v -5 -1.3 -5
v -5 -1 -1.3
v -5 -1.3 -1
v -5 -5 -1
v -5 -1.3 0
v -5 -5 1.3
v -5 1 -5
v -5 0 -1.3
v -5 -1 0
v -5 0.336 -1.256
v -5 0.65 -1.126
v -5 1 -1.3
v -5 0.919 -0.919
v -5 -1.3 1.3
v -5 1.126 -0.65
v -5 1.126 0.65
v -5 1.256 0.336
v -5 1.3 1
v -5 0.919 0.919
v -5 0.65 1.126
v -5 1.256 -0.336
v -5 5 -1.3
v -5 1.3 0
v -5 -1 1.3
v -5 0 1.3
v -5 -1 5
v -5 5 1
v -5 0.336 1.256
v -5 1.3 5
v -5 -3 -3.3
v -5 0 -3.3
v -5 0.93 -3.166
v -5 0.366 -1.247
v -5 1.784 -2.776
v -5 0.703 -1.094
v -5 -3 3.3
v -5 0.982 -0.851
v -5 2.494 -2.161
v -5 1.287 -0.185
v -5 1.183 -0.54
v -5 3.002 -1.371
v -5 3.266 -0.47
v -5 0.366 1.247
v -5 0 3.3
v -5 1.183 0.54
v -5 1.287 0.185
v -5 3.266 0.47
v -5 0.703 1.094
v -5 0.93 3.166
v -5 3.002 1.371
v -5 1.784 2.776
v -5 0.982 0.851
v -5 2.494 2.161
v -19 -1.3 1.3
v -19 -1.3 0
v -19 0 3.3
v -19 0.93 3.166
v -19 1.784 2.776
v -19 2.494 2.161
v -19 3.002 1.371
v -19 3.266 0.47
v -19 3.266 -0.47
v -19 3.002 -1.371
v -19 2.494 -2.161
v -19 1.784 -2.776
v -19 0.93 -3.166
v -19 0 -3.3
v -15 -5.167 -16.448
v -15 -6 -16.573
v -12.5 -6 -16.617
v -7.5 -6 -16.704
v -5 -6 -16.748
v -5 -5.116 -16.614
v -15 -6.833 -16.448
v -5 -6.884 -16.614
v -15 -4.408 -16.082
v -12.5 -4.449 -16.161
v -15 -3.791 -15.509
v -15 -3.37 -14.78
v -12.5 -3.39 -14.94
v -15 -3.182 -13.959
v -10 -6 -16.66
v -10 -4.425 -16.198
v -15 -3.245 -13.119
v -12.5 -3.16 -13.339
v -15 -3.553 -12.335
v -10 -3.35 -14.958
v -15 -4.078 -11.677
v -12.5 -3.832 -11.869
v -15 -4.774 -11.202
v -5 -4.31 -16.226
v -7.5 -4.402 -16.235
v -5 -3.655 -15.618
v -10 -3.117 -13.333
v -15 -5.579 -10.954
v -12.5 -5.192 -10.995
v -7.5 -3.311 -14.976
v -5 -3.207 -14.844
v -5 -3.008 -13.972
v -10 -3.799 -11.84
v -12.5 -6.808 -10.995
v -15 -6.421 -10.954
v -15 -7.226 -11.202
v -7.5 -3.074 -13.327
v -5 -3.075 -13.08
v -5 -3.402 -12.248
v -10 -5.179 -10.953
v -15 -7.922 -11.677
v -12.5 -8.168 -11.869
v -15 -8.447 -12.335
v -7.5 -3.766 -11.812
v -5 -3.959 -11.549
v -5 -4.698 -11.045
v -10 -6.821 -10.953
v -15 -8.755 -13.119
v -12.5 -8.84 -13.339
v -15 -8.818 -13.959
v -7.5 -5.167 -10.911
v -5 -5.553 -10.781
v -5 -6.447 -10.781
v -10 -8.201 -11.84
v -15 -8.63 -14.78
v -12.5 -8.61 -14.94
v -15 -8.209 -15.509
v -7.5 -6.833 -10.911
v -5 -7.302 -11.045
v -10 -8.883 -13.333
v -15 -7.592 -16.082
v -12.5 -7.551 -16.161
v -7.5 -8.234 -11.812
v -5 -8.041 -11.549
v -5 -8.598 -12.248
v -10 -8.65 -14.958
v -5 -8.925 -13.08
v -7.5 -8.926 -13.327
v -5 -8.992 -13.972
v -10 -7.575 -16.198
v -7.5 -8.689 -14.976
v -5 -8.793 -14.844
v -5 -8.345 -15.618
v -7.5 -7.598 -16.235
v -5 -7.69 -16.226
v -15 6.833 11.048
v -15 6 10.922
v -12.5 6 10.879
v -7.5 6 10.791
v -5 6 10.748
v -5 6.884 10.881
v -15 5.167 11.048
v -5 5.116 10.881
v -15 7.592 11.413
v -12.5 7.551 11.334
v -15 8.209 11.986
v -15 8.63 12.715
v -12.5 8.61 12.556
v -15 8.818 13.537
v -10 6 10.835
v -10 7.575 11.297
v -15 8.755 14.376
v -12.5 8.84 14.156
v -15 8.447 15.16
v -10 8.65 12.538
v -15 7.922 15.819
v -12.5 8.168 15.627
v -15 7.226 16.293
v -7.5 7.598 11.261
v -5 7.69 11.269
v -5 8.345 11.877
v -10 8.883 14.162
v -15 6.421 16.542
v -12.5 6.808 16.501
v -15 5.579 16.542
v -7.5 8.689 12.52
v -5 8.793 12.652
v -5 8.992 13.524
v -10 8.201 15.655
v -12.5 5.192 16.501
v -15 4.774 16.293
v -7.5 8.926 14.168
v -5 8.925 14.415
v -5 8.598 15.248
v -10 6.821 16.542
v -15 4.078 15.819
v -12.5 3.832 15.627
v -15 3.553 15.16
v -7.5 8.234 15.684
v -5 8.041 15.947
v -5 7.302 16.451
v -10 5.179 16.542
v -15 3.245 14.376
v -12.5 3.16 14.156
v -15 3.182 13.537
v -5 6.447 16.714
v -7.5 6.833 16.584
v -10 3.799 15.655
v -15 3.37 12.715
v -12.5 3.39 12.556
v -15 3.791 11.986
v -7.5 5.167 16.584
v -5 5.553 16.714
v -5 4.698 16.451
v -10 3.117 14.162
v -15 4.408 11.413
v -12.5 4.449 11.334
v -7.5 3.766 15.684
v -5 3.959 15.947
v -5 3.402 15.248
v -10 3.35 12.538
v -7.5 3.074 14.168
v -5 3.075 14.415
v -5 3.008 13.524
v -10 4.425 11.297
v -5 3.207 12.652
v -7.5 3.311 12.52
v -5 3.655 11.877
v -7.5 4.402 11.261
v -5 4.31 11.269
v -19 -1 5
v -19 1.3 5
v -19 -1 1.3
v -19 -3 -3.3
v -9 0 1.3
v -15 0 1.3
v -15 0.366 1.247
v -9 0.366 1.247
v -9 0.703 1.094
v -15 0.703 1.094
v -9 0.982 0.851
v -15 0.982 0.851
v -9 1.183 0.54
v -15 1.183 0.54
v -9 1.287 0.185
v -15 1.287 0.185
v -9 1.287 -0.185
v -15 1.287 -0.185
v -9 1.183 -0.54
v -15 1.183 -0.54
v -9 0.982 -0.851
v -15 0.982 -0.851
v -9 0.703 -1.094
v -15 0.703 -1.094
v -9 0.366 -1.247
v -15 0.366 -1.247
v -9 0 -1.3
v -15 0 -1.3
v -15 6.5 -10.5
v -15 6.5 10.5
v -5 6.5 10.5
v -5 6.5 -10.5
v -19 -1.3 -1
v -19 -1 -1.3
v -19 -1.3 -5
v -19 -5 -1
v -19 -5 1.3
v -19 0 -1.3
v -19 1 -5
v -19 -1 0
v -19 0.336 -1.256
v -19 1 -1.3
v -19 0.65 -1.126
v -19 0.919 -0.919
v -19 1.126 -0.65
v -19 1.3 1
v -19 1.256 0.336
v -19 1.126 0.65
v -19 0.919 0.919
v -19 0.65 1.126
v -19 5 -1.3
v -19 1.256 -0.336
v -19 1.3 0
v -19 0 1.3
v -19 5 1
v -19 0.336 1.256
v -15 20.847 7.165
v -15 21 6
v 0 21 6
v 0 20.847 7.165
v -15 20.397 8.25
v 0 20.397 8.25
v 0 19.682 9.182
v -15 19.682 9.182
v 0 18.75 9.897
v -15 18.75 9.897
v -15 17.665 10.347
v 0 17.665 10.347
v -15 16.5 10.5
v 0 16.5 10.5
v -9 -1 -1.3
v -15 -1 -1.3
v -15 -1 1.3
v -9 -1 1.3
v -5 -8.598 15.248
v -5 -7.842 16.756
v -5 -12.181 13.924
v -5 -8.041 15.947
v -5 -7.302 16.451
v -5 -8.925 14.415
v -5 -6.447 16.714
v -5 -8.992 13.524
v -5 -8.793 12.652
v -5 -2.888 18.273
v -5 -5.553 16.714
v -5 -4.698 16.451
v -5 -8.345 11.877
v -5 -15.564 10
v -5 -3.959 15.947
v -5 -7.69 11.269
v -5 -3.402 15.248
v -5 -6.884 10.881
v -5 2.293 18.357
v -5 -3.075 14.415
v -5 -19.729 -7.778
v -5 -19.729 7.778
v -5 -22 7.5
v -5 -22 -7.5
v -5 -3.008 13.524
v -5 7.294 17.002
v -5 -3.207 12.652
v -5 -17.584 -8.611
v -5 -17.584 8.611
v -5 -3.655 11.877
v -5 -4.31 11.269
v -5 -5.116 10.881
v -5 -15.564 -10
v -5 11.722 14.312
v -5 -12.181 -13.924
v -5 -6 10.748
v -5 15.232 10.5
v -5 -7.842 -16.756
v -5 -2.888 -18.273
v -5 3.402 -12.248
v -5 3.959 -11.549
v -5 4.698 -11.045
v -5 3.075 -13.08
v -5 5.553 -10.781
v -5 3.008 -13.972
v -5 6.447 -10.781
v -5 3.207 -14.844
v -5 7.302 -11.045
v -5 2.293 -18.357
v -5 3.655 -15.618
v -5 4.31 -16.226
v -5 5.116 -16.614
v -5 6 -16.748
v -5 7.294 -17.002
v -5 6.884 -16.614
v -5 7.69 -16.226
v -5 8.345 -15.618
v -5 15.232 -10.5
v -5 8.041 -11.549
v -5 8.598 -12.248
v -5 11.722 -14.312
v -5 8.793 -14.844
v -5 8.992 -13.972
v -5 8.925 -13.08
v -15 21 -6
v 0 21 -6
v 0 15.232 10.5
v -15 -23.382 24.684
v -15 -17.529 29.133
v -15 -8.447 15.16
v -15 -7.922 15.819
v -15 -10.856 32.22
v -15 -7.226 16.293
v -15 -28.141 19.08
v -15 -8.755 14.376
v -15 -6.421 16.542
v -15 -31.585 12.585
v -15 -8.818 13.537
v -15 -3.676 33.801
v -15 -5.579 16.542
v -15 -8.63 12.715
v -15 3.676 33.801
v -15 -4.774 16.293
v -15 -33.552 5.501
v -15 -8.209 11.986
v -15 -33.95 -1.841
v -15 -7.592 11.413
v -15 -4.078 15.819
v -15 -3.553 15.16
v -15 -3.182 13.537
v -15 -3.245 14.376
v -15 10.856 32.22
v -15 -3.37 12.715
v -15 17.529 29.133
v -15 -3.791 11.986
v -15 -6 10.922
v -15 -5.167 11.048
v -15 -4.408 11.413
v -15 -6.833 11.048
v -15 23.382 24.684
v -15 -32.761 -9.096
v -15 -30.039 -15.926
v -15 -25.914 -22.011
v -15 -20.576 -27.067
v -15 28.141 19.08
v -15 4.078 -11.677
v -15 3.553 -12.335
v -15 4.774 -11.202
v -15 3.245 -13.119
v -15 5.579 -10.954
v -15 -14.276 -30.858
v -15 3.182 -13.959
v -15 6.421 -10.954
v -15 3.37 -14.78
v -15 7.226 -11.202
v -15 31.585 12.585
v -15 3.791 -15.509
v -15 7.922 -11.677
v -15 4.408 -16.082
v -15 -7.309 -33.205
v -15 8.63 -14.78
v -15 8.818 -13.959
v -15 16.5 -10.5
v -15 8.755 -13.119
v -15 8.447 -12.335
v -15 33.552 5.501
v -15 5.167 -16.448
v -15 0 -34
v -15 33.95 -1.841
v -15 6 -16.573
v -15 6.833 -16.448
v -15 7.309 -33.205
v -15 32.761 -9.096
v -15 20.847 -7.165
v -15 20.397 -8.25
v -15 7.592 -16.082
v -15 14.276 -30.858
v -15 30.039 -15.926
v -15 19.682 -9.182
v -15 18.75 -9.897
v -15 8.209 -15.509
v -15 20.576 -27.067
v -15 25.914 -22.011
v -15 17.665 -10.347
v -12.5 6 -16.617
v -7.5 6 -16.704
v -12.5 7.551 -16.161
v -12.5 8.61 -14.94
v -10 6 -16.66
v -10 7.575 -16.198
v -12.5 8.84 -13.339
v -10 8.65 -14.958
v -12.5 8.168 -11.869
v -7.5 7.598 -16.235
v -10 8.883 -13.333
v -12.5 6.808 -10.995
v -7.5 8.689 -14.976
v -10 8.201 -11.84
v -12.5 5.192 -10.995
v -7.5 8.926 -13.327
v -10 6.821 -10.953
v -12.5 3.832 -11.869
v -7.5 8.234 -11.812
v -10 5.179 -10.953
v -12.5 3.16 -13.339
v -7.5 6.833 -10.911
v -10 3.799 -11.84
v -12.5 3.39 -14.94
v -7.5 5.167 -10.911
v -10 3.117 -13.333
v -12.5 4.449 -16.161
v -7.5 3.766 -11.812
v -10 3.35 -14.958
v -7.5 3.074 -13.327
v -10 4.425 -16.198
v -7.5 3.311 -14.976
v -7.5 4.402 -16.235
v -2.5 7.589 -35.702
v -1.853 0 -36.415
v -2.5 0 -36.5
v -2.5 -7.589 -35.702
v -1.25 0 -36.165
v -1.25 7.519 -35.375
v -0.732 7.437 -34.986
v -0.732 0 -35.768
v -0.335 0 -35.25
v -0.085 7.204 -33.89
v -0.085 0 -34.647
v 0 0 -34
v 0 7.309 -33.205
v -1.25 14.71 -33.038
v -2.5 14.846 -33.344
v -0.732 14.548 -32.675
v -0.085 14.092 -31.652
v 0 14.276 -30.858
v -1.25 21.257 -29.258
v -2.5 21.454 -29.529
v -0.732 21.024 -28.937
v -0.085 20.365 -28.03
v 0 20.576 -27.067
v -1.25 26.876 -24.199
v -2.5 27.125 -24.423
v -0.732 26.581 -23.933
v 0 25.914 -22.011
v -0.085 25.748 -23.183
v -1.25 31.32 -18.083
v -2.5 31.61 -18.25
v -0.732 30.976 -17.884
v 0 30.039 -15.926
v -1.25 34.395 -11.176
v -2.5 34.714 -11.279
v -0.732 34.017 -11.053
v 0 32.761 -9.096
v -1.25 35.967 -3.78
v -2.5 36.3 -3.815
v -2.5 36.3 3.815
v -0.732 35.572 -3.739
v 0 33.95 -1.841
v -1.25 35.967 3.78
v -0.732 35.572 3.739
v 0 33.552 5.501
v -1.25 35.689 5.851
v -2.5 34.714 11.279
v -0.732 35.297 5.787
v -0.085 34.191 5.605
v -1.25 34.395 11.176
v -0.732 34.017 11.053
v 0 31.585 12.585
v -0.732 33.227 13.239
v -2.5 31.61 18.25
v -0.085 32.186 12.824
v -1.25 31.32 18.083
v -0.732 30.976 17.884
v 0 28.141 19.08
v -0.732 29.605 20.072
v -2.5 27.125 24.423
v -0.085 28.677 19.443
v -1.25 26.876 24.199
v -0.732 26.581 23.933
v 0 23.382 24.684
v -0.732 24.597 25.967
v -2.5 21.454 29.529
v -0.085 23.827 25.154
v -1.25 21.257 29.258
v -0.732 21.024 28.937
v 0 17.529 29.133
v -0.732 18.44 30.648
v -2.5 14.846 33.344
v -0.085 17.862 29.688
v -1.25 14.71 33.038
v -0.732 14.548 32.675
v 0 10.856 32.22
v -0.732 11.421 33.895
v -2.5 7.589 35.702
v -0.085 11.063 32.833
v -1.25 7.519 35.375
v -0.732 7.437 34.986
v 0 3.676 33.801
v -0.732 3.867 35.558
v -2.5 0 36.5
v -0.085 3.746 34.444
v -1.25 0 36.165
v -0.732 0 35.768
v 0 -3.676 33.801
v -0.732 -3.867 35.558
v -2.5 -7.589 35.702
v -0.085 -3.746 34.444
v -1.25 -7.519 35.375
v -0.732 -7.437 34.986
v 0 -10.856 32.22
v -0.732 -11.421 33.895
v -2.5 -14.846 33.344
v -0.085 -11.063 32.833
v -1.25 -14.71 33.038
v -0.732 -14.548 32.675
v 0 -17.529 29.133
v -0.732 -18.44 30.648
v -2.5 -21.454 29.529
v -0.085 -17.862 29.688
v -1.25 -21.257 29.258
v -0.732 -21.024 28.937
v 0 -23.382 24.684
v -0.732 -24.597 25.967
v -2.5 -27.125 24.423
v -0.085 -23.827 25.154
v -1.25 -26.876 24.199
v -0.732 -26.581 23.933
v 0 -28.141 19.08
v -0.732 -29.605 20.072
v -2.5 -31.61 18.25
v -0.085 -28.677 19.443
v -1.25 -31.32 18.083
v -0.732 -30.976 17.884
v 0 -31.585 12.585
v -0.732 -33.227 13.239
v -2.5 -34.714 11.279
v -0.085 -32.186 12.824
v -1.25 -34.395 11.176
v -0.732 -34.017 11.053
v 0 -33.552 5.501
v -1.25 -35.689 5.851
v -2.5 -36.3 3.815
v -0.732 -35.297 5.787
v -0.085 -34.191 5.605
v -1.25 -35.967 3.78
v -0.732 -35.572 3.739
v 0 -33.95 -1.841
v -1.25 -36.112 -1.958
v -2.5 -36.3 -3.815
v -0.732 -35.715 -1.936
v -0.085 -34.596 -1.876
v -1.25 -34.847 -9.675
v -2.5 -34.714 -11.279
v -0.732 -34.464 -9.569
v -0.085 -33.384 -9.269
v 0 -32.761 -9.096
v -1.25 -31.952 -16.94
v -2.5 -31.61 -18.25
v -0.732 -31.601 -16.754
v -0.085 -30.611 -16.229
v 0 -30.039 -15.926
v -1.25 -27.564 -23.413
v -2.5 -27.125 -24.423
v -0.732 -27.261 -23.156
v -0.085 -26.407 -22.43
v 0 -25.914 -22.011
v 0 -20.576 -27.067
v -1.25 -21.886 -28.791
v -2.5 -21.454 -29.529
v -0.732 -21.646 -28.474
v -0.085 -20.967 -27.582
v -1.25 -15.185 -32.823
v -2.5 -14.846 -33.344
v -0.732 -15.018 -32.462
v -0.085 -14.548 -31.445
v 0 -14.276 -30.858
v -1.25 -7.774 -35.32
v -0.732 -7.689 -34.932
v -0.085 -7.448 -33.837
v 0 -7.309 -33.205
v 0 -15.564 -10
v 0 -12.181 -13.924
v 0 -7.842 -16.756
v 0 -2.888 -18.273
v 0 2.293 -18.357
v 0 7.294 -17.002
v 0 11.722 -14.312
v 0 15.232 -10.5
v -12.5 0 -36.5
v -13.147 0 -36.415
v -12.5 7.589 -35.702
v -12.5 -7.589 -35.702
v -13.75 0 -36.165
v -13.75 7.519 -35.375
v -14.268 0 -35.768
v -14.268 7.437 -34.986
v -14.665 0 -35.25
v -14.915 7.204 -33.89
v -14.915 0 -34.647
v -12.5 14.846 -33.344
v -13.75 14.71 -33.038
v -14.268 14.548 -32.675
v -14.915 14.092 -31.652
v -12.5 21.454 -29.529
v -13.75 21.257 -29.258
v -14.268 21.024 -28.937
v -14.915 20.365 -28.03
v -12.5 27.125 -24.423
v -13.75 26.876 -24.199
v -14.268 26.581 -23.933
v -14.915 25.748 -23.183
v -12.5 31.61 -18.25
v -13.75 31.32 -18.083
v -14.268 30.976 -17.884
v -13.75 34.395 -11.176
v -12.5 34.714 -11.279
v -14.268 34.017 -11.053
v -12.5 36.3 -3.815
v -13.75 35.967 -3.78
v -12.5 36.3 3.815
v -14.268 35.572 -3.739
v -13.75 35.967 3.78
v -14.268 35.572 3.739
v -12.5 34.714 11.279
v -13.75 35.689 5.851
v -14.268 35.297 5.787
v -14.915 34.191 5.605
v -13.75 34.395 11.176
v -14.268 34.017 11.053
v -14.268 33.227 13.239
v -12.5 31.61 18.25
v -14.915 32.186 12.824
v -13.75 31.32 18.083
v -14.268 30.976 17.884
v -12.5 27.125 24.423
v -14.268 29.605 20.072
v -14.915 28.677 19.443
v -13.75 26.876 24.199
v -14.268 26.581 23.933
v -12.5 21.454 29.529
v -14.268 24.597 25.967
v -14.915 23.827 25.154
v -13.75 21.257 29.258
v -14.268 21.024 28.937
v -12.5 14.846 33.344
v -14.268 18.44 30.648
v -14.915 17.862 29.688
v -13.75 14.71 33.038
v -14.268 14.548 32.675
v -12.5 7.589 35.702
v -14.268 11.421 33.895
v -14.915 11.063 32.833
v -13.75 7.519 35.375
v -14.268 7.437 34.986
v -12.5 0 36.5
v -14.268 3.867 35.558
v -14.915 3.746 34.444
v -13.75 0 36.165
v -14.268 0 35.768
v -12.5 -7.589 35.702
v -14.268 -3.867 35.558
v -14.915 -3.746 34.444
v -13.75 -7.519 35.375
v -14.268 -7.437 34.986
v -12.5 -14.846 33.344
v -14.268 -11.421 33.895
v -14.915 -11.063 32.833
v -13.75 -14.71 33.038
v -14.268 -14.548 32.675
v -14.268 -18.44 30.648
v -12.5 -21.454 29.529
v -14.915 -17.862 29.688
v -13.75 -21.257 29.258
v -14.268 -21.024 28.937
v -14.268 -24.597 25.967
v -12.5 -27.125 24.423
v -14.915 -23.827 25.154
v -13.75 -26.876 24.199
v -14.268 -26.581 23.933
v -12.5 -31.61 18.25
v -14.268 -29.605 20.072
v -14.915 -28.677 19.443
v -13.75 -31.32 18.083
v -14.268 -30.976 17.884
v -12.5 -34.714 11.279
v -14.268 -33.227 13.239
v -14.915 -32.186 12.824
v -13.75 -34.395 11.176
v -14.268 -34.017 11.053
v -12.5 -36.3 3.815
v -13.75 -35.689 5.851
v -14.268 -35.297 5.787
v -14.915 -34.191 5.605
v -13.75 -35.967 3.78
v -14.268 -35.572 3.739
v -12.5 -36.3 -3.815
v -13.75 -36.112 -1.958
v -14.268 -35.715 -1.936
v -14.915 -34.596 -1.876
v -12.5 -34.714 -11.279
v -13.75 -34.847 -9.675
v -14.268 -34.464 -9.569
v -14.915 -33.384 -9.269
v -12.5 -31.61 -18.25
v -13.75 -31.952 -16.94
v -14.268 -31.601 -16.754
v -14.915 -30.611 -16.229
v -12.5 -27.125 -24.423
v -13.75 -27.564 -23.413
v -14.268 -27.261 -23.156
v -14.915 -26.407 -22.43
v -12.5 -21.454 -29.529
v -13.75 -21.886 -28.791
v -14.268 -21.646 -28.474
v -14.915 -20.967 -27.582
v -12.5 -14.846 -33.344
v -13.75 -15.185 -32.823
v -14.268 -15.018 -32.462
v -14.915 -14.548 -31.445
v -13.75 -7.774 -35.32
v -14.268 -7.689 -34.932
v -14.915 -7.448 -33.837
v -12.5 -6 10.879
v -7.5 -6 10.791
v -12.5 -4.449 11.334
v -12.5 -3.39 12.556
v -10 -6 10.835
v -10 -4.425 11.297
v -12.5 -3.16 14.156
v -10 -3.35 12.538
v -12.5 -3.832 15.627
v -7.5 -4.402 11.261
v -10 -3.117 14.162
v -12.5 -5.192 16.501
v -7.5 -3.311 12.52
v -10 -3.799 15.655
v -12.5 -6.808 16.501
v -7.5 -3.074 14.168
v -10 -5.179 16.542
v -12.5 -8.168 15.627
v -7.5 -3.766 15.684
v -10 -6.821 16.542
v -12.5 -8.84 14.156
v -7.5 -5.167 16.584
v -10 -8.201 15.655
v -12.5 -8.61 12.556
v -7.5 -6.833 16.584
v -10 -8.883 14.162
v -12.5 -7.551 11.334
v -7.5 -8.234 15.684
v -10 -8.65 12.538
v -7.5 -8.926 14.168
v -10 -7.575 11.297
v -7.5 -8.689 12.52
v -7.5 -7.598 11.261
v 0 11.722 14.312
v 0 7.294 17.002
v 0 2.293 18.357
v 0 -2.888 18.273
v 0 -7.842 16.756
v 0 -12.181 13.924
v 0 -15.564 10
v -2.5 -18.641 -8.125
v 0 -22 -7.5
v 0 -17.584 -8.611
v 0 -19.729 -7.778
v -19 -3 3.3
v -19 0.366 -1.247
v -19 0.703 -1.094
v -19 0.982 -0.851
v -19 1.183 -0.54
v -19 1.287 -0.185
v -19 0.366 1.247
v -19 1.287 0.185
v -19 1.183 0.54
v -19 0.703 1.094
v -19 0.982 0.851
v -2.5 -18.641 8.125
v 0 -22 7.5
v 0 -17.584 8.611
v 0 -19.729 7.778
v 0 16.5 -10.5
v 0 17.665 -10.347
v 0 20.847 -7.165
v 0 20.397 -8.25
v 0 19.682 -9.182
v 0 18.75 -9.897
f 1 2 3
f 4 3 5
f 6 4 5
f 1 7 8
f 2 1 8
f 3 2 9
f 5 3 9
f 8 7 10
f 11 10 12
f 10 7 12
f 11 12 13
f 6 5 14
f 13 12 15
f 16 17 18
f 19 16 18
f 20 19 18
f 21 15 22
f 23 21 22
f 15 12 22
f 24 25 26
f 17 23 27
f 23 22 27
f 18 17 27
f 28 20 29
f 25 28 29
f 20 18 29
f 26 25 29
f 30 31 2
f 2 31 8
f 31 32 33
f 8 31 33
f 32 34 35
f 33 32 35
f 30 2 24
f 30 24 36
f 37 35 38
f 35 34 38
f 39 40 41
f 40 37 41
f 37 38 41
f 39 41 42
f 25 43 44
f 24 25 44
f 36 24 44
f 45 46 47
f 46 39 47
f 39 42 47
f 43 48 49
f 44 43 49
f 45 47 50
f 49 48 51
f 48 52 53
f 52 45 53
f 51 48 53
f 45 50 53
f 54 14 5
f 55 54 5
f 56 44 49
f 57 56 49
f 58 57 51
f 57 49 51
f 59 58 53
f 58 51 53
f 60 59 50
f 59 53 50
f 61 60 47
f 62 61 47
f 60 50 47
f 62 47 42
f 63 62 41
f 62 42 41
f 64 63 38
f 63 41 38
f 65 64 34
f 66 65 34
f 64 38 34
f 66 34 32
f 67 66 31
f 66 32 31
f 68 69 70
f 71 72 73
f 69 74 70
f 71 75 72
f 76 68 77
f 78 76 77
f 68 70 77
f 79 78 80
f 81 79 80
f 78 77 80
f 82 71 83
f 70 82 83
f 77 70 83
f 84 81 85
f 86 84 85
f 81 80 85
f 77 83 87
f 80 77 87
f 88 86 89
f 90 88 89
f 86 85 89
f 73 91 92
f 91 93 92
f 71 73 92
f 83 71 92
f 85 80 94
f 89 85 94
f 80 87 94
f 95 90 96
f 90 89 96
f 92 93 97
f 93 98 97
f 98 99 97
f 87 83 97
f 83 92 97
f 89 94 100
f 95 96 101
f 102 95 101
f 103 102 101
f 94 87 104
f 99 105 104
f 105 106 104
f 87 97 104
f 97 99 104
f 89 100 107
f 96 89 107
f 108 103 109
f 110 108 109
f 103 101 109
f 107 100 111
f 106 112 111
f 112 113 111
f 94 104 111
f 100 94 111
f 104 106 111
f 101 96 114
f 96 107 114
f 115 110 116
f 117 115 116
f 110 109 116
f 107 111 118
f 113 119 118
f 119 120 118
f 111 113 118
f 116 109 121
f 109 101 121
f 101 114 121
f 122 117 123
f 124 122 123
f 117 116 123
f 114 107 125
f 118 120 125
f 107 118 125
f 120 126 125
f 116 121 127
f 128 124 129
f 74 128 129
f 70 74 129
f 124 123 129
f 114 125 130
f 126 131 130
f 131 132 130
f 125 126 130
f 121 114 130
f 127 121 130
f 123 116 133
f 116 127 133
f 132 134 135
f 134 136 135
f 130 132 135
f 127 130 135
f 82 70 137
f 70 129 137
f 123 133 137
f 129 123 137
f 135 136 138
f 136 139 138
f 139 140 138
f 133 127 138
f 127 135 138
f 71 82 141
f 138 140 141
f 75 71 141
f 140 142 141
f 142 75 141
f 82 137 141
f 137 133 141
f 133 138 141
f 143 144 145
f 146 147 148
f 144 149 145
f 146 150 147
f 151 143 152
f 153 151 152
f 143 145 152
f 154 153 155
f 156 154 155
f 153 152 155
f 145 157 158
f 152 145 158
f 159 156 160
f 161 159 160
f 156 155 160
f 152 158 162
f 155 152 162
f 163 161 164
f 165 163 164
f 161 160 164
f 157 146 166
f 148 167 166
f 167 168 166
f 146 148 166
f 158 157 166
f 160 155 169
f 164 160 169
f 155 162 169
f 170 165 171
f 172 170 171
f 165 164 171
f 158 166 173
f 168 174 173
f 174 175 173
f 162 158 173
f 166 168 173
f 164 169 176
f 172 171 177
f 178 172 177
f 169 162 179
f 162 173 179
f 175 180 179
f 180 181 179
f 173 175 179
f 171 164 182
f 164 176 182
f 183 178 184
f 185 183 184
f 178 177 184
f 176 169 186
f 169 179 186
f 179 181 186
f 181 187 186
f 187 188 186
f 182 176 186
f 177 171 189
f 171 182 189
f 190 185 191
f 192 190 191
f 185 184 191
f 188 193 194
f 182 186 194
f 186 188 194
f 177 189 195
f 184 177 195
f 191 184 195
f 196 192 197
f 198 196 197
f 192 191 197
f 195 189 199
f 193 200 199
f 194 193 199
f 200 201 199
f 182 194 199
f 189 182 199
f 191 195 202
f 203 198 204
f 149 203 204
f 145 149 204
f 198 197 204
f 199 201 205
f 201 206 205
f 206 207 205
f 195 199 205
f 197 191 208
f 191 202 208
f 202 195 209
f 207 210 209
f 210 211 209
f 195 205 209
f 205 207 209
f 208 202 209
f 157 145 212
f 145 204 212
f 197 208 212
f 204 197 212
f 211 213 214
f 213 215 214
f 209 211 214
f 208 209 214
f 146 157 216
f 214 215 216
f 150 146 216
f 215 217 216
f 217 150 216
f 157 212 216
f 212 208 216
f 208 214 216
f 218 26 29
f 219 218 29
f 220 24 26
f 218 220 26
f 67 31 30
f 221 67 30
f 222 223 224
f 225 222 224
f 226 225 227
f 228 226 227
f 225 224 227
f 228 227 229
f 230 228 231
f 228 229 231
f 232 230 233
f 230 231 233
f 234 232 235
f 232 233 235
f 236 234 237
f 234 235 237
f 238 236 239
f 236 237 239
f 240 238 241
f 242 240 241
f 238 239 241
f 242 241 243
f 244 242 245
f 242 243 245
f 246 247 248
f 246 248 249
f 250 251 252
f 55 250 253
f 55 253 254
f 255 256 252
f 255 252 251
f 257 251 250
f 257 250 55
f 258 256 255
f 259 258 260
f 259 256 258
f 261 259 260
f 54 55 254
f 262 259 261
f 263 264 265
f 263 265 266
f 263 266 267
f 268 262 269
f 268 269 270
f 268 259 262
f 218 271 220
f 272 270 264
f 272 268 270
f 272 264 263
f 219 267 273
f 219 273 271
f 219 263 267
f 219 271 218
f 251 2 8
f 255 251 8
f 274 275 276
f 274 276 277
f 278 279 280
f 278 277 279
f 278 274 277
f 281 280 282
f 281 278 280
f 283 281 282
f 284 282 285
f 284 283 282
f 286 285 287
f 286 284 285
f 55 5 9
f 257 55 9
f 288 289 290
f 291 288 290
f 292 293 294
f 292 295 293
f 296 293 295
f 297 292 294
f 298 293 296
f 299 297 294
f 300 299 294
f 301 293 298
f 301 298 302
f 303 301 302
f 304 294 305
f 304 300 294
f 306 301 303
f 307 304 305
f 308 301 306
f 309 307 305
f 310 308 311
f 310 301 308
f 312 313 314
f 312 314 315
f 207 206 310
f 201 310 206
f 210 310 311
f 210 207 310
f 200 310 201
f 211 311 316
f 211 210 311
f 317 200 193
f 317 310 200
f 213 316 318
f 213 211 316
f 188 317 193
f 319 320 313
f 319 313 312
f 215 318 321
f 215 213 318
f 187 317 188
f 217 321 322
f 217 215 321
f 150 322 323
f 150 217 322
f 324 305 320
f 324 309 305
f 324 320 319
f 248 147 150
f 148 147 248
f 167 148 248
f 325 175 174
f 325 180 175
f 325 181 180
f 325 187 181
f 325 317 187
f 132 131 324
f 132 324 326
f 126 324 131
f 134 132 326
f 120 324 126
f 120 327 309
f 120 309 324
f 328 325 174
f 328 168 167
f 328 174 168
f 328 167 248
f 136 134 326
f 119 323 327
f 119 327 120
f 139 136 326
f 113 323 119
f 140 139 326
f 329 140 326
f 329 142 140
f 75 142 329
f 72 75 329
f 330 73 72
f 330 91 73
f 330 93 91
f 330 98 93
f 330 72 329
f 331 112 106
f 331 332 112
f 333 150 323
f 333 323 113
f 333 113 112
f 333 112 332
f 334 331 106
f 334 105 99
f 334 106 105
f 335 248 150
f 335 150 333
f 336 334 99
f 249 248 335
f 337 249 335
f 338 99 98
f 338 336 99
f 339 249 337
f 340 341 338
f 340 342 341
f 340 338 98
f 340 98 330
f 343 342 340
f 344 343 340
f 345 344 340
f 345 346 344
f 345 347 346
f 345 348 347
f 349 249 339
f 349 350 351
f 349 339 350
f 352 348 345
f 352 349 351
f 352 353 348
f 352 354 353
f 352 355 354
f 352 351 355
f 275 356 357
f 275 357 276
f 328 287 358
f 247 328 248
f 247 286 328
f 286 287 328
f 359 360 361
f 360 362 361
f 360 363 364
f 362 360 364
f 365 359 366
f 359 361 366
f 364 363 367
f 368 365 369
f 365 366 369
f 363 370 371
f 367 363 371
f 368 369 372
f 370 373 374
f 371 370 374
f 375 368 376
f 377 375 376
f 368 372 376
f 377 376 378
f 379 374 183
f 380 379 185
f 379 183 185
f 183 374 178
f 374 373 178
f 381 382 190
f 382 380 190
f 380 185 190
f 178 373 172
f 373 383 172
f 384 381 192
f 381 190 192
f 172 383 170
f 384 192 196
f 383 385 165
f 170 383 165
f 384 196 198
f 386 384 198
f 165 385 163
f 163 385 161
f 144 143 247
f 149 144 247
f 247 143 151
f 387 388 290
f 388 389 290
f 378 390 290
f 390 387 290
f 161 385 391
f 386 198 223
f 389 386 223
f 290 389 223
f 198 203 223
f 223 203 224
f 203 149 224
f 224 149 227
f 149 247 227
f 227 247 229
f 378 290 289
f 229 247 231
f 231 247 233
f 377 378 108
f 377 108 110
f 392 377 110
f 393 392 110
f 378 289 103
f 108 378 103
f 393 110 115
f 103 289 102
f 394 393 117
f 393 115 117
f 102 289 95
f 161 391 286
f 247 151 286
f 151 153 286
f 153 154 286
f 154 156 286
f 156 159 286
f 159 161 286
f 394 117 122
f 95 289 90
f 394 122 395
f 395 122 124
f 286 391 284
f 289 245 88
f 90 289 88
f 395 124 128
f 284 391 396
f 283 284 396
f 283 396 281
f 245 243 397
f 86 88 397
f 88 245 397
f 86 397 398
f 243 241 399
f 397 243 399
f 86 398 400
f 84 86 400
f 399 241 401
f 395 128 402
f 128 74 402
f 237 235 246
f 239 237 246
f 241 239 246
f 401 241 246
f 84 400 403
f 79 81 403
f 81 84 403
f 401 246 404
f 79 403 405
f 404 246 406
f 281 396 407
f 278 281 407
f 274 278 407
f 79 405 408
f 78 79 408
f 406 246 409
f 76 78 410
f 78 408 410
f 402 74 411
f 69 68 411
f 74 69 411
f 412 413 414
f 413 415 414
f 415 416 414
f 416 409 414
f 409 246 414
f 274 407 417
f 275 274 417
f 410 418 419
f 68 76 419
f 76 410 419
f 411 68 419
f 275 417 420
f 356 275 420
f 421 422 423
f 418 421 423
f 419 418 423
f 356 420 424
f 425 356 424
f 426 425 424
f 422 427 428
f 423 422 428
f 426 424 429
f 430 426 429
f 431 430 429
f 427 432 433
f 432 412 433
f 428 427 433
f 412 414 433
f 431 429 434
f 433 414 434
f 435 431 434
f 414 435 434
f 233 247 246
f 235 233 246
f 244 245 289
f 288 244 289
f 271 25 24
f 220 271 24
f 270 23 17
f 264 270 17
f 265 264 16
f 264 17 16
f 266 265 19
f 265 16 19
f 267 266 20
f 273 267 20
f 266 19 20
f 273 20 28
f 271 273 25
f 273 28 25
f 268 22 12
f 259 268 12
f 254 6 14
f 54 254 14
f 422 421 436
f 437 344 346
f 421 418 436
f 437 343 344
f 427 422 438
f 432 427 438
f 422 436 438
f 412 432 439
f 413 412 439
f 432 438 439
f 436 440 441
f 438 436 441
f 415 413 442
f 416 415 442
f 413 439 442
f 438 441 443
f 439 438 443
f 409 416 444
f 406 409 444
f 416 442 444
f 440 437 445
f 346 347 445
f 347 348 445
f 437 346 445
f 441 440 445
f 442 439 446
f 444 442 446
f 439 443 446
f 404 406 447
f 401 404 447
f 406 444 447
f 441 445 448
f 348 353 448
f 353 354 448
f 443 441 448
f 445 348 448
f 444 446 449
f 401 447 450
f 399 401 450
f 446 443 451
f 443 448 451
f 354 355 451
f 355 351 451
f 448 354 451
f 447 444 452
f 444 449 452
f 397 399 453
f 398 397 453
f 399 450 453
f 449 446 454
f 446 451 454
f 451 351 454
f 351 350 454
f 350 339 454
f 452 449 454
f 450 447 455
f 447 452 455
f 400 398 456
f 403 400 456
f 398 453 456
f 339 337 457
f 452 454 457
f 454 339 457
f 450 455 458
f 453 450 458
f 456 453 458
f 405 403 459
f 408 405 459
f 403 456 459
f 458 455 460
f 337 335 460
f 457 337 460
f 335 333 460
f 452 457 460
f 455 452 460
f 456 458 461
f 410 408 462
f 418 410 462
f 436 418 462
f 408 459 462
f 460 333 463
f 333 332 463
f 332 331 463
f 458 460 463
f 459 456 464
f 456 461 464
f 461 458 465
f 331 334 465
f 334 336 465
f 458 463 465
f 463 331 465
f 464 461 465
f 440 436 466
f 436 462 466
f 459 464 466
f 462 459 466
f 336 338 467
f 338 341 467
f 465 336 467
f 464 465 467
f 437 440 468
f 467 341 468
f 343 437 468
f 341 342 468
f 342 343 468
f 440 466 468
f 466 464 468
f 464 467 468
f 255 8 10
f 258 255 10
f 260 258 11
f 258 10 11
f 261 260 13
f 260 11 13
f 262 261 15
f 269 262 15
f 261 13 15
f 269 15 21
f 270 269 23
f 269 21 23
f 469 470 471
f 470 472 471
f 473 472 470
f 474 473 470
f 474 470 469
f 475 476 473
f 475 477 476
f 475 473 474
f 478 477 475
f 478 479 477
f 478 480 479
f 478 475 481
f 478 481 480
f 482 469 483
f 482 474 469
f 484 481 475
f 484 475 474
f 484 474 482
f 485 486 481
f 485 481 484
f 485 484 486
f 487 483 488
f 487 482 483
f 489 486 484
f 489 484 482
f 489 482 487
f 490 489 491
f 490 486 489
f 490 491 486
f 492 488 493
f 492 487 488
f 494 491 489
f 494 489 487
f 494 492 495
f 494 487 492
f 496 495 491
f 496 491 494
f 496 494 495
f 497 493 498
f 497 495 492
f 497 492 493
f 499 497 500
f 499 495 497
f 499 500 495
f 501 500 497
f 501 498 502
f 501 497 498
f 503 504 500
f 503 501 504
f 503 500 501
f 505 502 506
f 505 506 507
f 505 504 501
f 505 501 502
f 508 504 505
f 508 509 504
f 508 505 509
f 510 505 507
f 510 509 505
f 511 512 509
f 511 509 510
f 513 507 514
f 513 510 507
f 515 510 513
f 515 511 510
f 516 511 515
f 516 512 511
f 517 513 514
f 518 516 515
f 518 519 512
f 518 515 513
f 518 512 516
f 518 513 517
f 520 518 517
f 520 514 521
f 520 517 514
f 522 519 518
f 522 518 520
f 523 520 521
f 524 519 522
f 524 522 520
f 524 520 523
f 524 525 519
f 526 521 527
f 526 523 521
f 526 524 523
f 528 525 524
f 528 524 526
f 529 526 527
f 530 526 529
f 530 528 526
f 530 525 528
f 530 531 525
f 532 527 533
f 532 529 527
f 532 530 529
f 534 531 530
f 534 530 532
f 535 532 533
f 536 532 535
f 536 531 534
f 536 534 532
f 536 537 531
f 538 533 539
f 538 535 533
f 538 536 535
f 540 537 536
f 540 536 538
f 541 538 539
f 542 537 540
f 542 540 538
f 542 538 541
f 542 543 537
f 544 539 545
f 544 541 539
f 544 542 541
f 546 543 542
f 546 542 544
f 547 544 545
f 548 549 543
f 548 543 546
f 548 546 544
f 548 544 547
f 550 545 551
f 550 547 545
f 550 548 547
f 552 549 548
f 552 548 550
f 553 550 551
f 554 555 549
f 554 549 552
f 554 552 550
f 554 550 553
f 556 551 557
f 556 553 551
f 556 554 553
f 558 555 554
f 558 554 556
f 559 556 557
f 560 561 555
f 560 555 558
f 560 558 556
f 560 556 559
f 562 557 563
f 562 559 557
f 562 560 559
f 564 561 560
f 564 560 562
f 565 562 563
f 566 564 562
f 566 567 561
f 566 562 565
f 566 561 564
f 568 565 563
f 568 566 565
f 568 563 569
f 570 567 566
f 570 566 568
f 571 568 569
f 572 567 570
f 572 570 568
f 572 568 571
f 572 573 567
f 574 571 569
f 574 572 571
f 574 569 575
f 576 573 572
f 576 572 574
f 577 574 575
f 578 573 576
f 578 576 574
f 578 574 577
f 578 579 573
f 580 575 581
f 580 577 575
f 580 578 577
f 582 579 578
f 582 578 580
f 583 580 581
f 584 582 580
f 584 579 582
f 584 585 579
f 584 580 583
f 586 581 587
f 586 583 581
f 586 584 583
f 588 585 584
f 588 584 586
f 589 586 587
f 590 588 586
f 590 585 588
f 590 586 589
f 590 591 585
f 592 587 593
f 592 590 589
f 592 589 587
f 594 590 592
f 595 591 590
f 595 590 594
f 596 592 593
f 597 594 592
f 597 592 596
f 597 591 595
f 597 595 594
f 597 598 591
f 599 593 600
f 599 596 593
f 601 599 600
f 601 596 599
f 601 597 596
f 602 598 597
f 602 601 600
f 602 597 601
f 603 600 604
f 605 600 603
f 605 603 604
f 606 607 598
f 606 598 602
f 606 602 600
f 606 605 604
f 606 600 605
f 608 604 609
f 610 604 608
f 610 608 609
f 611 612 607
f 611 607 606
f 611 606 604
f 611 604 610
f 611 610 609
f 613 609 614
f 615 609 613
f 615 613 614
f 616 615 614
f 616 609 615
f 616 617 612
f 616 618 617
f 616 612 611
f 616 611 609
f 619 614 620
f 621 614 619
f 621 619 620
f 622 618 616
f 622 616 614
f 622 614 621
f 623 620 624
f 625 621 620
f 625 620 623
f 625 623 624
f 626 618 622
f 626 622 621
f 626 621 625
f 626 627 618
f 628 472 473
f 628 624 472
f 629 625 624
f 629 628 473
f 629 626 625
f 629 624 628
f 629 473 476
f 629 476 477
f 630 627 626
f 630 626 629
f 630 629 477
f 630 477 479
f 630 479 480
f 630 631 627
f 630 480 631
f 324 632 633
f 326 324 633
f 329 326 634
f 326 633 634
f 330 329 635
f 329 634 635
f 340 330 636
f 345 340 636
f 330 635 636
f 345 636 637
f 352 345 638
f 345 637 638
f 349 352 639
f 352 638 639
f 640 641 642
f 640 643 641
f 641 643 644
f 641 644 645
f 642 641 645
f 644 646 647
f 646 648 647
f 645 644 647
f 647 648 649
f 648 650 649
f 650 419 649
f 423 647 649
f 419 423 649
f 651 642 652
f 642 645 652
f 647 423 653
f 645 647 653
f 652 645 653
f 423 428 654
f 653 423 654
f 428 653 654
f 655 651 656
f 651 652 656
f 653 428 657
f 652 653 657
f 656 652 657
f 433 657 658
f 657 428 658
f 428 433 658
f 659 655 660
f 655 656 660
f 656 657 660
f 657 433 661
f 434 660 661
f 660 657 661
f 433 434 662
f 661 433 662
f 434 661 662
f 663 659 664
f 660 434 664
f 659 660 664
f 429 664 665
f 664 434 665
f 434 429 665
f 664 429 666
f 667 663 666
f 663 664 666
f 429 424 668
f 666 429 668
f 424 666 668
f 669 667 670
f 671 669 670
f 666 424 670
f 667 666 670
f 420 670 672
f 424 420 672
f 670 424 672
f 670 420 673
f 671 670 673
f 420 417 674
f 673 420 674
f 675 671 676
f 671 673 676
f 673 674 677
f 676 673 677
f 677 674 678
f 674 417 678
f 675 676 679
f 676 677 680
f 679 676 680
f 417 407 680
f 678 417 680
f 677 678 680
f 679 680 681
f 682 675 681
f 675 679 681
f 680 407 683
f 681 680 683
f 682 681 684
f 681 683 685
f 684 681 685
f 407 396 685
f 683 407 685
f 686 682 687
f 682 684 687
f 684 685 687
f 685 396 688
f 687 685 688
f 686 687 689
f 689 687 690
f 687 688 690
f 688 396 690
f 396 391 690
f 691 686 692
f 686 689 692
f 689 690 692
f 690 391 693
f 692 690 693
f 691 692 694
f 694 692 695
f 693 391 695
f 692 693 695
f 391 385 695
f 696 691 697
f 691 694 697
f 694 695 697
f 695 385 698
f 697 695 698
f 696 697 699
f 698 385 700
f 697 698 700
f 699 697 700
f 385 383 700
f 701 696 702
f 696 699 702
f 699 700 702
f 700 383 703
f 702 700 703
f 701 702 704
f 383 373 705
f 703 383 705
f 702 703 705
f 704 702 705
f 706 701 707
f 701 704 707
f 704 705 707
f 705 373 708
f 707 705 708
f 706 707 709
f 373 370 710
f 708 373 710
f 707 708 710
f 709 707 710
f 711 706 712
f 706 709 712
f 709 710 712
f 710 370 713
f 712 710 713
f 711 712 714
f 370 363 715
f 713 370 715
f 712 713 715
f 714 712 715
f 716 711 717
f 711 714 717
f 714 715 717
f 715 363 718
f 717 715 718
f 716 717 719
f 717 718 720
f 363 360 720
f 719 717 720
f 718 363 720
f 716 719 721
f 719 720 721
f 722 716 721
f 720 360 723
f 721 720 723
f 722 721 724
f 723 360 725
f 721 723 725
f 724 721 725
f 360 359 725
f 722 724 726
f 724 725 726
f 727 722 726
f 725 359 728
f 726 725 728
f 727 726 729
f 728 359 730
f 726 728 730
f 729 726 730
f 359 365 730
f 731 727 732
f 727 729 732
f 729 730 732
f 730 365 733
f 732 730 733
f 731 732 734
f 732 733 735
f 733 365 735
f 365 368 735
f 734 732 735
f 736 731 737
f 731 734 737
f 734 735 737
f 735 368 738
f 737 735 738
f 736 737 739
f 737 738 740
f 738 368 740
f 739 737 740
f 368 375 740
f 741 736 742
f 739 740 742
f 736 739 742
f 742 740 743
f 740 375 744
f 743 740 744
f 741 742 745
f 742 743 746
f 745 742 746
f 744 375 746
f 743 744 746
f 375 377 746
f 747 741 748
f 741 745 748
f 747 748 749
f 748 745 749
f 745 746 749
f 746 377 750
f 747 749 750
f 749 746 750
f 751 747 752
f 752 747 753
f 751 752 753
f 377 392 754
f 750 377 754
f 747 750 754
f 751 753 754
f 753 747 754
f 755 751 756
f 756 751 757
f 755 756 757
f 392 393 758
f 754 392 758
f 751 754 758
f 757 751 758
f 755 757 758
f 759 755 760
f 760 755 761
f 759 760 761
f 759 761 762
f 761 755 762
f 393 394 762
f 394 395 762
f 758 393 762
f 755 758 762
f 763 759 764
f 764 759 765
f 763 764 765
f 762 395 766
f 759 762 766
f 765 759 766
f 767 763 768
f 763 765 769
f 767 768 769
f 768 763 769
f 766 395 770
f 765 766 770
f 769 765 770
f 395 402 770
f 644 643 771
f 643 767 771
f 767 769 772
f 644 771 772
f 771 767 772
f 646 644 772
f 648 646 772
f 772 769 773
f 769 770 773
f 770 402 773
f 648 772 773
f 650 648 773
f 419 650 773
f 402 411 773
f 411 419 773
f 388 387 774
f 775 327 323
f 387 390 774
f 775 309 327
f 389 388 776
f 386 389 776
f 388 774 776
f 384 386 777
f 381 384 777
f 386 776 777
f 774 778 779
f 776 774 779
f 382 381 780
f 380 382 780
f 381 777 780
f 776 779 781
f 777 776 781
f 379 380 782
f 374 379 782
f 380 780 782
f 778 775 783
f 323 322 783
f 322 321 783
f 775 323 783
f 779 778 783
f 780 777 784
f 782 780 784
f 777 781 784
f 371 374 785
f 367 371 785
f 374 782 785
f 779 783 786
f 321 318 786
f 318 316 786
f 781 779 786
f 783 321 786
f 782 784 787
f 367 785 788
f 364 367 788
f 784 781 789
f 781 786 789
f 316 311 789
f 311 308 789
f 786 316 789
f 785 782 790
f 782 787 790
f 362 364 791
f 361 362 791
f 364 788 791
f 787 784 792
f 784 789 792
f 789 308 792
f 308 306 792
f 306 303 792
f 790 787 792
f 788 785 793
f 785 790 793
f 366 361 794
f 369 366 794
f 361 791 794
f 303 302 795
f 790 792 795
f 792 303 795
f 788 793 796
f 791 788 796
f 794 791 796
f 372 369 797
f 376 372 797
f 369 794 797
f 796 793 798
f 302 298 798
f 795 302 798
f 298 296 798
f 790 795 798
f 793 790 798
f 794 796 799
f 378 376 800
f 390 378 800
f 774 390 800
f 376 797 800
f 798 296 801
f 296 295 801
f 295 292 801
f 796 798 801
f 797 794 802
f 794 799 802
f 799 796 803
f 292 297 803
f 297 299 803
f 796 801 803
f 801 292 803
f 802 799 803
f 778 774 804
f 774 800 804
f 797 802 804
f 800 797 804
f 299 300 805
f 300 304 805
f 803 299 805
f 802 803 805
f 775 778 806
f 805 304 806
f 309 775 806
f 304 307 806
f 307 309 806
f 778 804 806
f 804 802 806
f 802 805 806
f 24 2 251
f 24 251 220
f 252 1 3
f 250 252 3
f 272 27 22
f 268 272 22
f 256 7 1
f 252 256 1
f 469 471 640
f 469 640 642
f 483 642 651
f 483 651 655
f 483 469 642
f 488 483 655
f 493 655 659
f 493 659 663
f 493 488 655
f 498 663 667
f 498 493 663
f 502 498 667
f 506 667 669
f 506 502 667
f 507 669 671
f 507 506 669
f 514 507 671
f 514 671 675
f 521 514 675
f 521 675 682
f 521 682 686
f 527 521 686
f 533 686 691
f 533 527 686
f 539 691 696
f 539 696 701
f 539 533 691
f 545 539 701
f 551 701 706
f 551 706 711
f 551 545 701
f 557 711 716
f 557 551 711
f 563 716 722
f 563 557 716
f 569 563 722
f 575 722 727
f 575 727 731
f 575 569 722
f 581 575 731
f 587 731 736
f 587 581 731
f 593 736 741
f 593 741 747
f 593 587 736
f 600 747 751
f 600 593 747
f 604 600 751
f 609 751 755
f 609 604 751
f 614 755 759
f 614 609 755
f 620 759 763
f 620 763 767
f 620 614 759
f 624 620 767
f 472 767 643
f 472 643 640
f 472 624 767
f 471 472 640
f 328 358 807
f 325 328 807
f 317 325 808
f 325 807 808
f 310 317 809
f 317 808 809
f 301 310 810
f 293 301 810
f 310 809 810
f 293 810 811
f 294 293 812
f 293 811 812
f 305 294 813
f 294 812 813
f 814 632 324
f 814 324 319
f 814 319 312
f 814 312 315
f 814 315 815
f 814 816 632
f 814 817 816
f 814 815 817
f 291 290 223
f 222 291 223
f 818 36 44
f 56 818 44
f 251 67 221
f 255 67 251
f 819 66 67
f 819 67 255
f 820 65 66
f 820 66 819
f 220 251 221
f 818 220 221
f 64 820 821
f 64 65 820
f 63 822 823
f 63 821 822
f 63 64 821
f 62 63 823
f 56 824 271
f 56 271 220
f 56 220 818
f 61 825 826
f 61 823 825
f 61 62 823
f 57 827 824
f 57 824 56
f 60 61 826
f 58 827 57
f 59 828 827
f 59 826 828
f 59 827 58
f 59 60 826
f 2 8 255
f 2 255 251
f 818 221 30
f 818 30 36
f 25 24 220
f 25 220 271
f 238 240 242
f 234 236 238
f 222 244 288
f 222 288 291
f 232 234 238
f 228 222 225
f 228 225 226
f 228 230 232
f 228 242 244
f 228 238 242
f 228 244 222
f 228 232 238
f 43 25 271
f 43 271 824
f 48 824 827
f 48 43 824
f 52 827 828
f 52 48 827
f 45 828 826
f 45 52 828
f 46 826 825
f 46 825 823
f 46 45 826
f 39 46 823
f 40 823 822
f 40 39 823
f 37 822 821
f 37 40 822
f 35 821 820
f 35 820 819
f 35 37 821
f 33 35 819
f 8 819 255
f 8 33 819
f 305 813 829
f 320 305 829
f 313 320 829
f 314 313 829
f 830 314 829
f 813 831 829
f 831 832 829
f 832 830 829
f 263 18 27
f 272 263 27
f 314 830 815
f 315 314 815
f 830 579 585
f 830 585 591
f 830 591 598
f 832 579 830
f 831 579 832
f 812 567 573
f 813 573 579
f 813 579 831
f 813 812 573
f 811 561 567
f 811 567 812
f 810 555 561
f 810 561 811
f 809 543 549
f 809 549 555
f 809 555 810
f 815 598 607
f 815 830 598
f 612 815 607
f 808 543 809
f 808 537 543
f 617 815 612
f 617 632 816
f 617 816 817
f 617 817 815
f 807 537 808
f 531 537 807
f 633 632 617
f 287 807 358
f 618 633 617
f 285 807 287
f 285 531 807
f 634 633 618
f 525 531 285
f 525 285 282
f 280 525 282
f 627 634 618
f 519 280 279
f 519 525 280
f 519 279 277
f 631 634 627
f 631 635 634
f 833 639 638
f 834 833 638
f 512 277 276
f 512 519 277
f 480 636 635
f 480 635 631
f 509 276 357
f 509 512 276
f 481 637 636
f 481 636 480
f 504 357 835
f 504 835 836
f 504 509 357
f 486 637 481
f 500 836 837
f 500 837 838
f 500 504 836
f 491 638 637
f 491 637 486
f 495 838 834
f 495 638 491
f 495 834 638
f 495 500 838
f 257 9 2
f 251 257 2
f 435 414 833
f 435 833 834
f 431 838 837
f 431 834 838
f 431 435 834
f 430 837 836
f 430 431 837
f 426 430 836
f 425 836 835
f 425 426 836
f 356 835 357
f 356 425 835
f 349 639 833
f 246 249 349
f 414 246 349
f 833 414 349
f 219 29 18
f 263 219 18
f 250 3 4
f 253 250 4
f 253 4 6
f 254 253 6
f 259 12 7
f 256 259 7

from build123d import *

# Parameters (mm, degrees)
SKETCH2_R                    = 36.5
BOSS_EXTRUDE1_DEPTH          = 15
CUT_EXTRUDE1_DEPTH           = 5
CUT_EXTRUDE2_DEPTH           = 10
CUT_EXTRUDE2_DEPTH_BACK      = 53.57851286
SKETCH4_3_R                  = 3
CUT_EXTRUDE4_DEPTH           = 10
CUT_EXTRUDE4_DRAFT           = -1
CUT_EXTRUDE4_PROFILE_2_DEPTH = 10
CUT_EXTRUDE4_PROFILE_2_DRAFT = -1
CUT_EXTRUDE4_PROFILE_3_DEPTH = 10
CUT_EXTRUDE4_PROFILE_3_DRAFT = -1
CUT_EXTRUDE4_PROFILE_4_DEPTH = 10
CUT_EXTRUDE4_PROFILE_4_DRAFT = -1
EXTRUDE_THIN1_DEPTH          = 4
EXTRUDE_THIN1_DEPTH_BACK     = 10
BOSS_EXTRUDE8_DEPTH          = 4
BOSS_EXTRUDE8_DEPTH_BACK     = 10
CUT_EXTRUDE5_DEPTH           = 6
FILLET1_R                    = 2.5


with BuildPart() as part:
    # Sketch2 → Boss-Extrude1 (new body)
    with BuildSketch(Plane(origin=(0, 0, 0), x_dir=(0, 0, -1), z_dir=(1, 0, 0))):
        Circle(SKETCH2_R)
    extrude(amount=-BOSS_EXTRUDE1_DEPTH)

    # Sketch3 → Cut-Extrude1 (cut)
    with BuildSketch(Plane(origin=(0, 0, 0), x_dir=(0, 0, -1), z_dir=(1, 0, 0))):
        with BuildLine():
            add(Edge.make_bspline(
                [(-10, -15.564382416), (-7.5, -18.5), (-7.5, -22)],
                knots=[0, 0, 0, 1, 1, 1], degree=2))
            Line((-7.5, -22), (7.5, -22))
            add(Edge.make_bspline(
                [(10, -15.564382416), (7.5, -18.5), (7.5, -22)],
                knots=[0, 0, 0, 1, 1, 1], degree=2))
            ThreePointArc((10, -15.564382416), (0, 18.5), (-10, -15.564382416))
        make_face()
    extrude(amount=-CUT_EXTRUDE1_DEPTH, mode=Mode.SUBTRACT)

    # Sketch4 → Cut-Extrude2 (cut, two sides: drawn at the far end of the back side and taken through both)
    with BuildSketch(Plane(origin=(-5, 0, 0), x_dir=(0, 0, -1), z_dir=(1, 0, 0)).offset(-CUT_EXTRUDE2_DEPTH_BACK)):
        with BuildLine():
            ThreePointArc((-6, 21), (-9.181980515, 19.681980515), (-10.5, 16.5))
            Line((-10.5, 16.5), (-10.5, 6.5))
            Line((-10.5, 6.5), (10.5, 6.5))
            Line((10.5, 6.5), (10.5, 16.5))
            ThreePointArc((10.5, 16.5), (9.181980515, 19.681980515), (6, 21))
            Line((6, 21), (-6, 21))
        make_face()
    extrude(amount=CUT_EXTRUDE2_DEPTH + CUT_EXTRUDE2_DEPTH_BACK, mode=Mode.SUBTRACT)


with BuildPart() as cut_extrude4_tool:
    # Sketch4<3> → Cut-Extrude4 (with draft: the straight prism first)
    with BuildSketch(Plane(origin=(-5, 0, 0), x_dir=(0, 0, -1), z_dir=(1, 0, 0))):
        with Locations((13.747727085, 6)):
            Circle(SKETCH4_3_R)
    extrude(amount=-CUT_EXTRUDE4_DEPTH)
    # Cut-Extrude4: the draft: its side faces are tilted about the plane it starts from
    cut_extrude4_sides = [cut_extrude4_tool.faces().sort_by_distance(p)[0] for p in [
        (-10, 6, -10.747727085),
    ]]
    draft(cut_extrude4_sides, Plane(origin=(-5, 0, 0), x_dir=(0, 0, -1), z_dir=(1, 0, 0)), CUT_EXTRUDE4_DRAFT)


with BuildPart() as part_1:
    add(part.part)

    # Cut-Extrude4: cut by cut_extrude4_tool
    add(cut_extrude4_tool.part, mode=Mode.SUBTRACT)


with BuildPart() as cut_extrude4_profile_2_tool:
    # Sketch4<3> → Cut-Extrude4 profile 2 (with draft: the straight prism first)
    with BuildSketch(Plane(origin=(-5, 0, 0), x_dir=(0, 0, -1), z_dir=(1, 0, 0))):
        with Locations((13.747727085, -6)):
            Circle(SKETCH4_3_R)
    extrude(amount=-CUT_EXTRUDE4_PROFILE_2_DEPTH)
    # Cut-Extrude4 profile 2: the draft: its side faces are tilted about the plane it starts from
    cut_extrude4_profile_2_sides = [cut_extrude4_profile_2_tool.faces().sort_by_distance(p)[0] for p in [
        (-10, -6, -10.747727085),
    ]]
    draft(cut_extrude4_profile_2_sides, Plane(origin=(-5, 0, 0), x_dir=(0, 0, -1), z_dir=(1, 0, 0)), CUT_EXTRUDE4_PROFILE_2_DRAFT)


with BuildPart() as part_2:
    add(part_1.part)

    # Cut-Extrude4 profile 2: cut by cut_extrude4_profile_2_tool
    add(cut_extrude4_profile_2_tool.part, mode=Mode.SUBTRACT)


with BuildPart() as cut_extrude4_profile_3_tool:
    # Sketch4<3> → Cut-Extrude4 profile 3 (with draft: the straight prism first)
    with BuildSketch(Plane(origin=(-5, 0, 0), x_dir=(0, 0, -1), z_dir=(1, 0, 0))):
        with Locations((-13.747727085, 6)):
            Circle(SKETCH4_3_R)
    extrude(amount=-CUT_EXTRUDE4_PROFILE_3_DEPTH)
    # Cut-Extrude4 profile 3: the draft: its side faces are tilted about the plane it starts from
    cut_extrude4_profile_3_sides = [cut_extrude4_profile_3_tool.faces().sort_by_distance(p)[0] for p in [
        (-10, 6, 16.747727085),
    ]]
    draft(cut_extrude4_profile_3_sides, Plane(origin=(-5, 0, 0), x_dir=(0, 0, -1), z_dir=(1, 0, 0)), CUT_EXTRUDE4_PROFILE_3_DRAFT)


with BuildPart() as part_3:
    add(part_2.part)

    # Cut-Extrude4 profile 3: cut by cut_extrude4_profile_3_tool
    add(cut_extrude4_profile_3_tool.part, mode=Mode.SUBTRACT)


with BuildPart() as cut_extrude4_profile_4_tool:
    # Sketch4<3> → Cut-Extrude4 profile 4 (with draft: the straight prism first)
    with BuildSketch(Plane(origin=(-5, 0, 0), x_dir=(0, 0, -1), z_dir=(1, 0, 0))):
        with Locations((-13.747727085, -6)):
            Circle(SKETCH4_3_R)
    extrude(amount=-CUT_EXTRUDE4_PROFILE_4_DEPTH)
    # Cut-Extrude4 profile 4: the draft: its side faces are tilted about the plane it starts from
    cut_extrude4_profile_4_sides = [cut_extrude4_profile_4_tool.faces().sort_by_distance(p)[0] for p in [
        (-10, -6, 16.747727085),
    ]]
    draft(cut_extrude4_profile_4_sides, Plane(origin=(-5, 0, 0), x_dir=(0, 0, -1), z_dir=(1, 0, 0)), CUT_EXTRUDE4_PROFILE_4_DRAFT)


with BuildPart() as part_4:
    add(part_3.part)

    # Cut-Extrude4 profile 4: cut by cut_extrude4_profile_4_tool
    add(cut_extrude4_profile_4_tool.part, mode=Mode.SUBTRACT)

    # Sketch10 → Cut-Extrude5 (cut)
    with BuildSketch(Plane.ZY.offset(15)):
        with BuildLine():
            Line((1.3, -1), (1.3, 0))
            ThreePointArc((1.3, 0), (0, 1.3), (-1.3, 0))
            Line((-1.3, 0), (-1.3, -1))
            Line((-1.3, -1), (1.3, -1))
        make_face()
    extrude(amount=-CUT_EXTRUDE5_DEPTH, mode=Mode.SUBTRACT)

    # Fillet1
    fillet1_edges = [part_4.edges().sort_by_distance(p)[0] for p in [
        (0, 0, 36.5),
        (-15, 0, 36.5),
    ]]
    fillet(fillet1_edges, radius=FILLET1_R)


with BuildPart() as body_2:
    # Sketch5 → Extrude-Thin1 (new, two sides: drawn at the far end of the back side and taken through both)
    with BuildSketch(Plane.ZY.offset(15).offset(-EXTRUDE_THIN1_DEPTH_BACK)):
        with BuildLine():
            Line((-3.3, 0), (-3.3, -3))
            Line((-3.3, -3), (3.3, -3))
            Line((3.3, -3), (3.3, 0))
            ThreePointArc((3.3, 0), (0, 3.3), (-3.3, 0))
        make_face()
        with BuildLine():
            Line((-1.3, 0), (-1.3, -1))
            Line((-1.3, -1), (1.3, -1))
            Line((1.3, -1), (1.3, 0))
            ThreePointArc((1.3, 0), (0, 1.3), (-1.3, 0))
        make_face(mode=Mode.SUBTRACT)
    extrude(amount=EXTRUDE_THIN1_DEPTH + EXTRUDE_THIN1_DEPTH_BACK)


with BuildPart() as body_3:
    # Sketch5<4> → Boss-Extrude8 (new, two sides: drawn at the far end of the back side and taken through both)
    with BuildSketch(Plane.ZY.offset(15).offset(-BOSS_EXTRUDE8_DEPTH_BACK)):
        Polygon((-1.3, -1), (-1.3, 0), (-1.3, 1), (-5, 1), (-5, -1.3), (-1, -1.3), (0, -1.3), (0, -1), align=None)
        with BuildLine():
            Line((-1.3, 1), (-1.3, 0))
            ThreePointArc((-1.3, 0), (-0.919238816, 0.919238816), (0, 1.3))
            Line((0, 1.3), (1, 1.3))
            Line((1, 1.3), (1, 5))
            Line((1, 5), (-1.3, 5))
            Line((-1.3, 5), (-1.3, 1))
        make_face()
        with BuildLine():
            Line((1, 1.3), (0, 1.3))
            ThreePointArc((0, 1.3), (0.919238816, 0.919238816), (1.3, 0))
            Line((1.3, 0), (1.3, -1))
            Line((1.3, -1), (5, -1))
            Line((5, -1), (5, 1.3))
            Line((5, 1.3), (1, 1.3))
        make_face()
        Polygon((1.3, -1.3), (0, -1.3), (-1, -1.3), (-1, -5), (1.3, -5), align=None)
    extrude(amount=BOSS_EXTRUDE8_DEPTH + BOSS_EXTRUDE8_DEPTH_BACK)


solid = Compound([part_4.part, body_2.part, body_3.part])
